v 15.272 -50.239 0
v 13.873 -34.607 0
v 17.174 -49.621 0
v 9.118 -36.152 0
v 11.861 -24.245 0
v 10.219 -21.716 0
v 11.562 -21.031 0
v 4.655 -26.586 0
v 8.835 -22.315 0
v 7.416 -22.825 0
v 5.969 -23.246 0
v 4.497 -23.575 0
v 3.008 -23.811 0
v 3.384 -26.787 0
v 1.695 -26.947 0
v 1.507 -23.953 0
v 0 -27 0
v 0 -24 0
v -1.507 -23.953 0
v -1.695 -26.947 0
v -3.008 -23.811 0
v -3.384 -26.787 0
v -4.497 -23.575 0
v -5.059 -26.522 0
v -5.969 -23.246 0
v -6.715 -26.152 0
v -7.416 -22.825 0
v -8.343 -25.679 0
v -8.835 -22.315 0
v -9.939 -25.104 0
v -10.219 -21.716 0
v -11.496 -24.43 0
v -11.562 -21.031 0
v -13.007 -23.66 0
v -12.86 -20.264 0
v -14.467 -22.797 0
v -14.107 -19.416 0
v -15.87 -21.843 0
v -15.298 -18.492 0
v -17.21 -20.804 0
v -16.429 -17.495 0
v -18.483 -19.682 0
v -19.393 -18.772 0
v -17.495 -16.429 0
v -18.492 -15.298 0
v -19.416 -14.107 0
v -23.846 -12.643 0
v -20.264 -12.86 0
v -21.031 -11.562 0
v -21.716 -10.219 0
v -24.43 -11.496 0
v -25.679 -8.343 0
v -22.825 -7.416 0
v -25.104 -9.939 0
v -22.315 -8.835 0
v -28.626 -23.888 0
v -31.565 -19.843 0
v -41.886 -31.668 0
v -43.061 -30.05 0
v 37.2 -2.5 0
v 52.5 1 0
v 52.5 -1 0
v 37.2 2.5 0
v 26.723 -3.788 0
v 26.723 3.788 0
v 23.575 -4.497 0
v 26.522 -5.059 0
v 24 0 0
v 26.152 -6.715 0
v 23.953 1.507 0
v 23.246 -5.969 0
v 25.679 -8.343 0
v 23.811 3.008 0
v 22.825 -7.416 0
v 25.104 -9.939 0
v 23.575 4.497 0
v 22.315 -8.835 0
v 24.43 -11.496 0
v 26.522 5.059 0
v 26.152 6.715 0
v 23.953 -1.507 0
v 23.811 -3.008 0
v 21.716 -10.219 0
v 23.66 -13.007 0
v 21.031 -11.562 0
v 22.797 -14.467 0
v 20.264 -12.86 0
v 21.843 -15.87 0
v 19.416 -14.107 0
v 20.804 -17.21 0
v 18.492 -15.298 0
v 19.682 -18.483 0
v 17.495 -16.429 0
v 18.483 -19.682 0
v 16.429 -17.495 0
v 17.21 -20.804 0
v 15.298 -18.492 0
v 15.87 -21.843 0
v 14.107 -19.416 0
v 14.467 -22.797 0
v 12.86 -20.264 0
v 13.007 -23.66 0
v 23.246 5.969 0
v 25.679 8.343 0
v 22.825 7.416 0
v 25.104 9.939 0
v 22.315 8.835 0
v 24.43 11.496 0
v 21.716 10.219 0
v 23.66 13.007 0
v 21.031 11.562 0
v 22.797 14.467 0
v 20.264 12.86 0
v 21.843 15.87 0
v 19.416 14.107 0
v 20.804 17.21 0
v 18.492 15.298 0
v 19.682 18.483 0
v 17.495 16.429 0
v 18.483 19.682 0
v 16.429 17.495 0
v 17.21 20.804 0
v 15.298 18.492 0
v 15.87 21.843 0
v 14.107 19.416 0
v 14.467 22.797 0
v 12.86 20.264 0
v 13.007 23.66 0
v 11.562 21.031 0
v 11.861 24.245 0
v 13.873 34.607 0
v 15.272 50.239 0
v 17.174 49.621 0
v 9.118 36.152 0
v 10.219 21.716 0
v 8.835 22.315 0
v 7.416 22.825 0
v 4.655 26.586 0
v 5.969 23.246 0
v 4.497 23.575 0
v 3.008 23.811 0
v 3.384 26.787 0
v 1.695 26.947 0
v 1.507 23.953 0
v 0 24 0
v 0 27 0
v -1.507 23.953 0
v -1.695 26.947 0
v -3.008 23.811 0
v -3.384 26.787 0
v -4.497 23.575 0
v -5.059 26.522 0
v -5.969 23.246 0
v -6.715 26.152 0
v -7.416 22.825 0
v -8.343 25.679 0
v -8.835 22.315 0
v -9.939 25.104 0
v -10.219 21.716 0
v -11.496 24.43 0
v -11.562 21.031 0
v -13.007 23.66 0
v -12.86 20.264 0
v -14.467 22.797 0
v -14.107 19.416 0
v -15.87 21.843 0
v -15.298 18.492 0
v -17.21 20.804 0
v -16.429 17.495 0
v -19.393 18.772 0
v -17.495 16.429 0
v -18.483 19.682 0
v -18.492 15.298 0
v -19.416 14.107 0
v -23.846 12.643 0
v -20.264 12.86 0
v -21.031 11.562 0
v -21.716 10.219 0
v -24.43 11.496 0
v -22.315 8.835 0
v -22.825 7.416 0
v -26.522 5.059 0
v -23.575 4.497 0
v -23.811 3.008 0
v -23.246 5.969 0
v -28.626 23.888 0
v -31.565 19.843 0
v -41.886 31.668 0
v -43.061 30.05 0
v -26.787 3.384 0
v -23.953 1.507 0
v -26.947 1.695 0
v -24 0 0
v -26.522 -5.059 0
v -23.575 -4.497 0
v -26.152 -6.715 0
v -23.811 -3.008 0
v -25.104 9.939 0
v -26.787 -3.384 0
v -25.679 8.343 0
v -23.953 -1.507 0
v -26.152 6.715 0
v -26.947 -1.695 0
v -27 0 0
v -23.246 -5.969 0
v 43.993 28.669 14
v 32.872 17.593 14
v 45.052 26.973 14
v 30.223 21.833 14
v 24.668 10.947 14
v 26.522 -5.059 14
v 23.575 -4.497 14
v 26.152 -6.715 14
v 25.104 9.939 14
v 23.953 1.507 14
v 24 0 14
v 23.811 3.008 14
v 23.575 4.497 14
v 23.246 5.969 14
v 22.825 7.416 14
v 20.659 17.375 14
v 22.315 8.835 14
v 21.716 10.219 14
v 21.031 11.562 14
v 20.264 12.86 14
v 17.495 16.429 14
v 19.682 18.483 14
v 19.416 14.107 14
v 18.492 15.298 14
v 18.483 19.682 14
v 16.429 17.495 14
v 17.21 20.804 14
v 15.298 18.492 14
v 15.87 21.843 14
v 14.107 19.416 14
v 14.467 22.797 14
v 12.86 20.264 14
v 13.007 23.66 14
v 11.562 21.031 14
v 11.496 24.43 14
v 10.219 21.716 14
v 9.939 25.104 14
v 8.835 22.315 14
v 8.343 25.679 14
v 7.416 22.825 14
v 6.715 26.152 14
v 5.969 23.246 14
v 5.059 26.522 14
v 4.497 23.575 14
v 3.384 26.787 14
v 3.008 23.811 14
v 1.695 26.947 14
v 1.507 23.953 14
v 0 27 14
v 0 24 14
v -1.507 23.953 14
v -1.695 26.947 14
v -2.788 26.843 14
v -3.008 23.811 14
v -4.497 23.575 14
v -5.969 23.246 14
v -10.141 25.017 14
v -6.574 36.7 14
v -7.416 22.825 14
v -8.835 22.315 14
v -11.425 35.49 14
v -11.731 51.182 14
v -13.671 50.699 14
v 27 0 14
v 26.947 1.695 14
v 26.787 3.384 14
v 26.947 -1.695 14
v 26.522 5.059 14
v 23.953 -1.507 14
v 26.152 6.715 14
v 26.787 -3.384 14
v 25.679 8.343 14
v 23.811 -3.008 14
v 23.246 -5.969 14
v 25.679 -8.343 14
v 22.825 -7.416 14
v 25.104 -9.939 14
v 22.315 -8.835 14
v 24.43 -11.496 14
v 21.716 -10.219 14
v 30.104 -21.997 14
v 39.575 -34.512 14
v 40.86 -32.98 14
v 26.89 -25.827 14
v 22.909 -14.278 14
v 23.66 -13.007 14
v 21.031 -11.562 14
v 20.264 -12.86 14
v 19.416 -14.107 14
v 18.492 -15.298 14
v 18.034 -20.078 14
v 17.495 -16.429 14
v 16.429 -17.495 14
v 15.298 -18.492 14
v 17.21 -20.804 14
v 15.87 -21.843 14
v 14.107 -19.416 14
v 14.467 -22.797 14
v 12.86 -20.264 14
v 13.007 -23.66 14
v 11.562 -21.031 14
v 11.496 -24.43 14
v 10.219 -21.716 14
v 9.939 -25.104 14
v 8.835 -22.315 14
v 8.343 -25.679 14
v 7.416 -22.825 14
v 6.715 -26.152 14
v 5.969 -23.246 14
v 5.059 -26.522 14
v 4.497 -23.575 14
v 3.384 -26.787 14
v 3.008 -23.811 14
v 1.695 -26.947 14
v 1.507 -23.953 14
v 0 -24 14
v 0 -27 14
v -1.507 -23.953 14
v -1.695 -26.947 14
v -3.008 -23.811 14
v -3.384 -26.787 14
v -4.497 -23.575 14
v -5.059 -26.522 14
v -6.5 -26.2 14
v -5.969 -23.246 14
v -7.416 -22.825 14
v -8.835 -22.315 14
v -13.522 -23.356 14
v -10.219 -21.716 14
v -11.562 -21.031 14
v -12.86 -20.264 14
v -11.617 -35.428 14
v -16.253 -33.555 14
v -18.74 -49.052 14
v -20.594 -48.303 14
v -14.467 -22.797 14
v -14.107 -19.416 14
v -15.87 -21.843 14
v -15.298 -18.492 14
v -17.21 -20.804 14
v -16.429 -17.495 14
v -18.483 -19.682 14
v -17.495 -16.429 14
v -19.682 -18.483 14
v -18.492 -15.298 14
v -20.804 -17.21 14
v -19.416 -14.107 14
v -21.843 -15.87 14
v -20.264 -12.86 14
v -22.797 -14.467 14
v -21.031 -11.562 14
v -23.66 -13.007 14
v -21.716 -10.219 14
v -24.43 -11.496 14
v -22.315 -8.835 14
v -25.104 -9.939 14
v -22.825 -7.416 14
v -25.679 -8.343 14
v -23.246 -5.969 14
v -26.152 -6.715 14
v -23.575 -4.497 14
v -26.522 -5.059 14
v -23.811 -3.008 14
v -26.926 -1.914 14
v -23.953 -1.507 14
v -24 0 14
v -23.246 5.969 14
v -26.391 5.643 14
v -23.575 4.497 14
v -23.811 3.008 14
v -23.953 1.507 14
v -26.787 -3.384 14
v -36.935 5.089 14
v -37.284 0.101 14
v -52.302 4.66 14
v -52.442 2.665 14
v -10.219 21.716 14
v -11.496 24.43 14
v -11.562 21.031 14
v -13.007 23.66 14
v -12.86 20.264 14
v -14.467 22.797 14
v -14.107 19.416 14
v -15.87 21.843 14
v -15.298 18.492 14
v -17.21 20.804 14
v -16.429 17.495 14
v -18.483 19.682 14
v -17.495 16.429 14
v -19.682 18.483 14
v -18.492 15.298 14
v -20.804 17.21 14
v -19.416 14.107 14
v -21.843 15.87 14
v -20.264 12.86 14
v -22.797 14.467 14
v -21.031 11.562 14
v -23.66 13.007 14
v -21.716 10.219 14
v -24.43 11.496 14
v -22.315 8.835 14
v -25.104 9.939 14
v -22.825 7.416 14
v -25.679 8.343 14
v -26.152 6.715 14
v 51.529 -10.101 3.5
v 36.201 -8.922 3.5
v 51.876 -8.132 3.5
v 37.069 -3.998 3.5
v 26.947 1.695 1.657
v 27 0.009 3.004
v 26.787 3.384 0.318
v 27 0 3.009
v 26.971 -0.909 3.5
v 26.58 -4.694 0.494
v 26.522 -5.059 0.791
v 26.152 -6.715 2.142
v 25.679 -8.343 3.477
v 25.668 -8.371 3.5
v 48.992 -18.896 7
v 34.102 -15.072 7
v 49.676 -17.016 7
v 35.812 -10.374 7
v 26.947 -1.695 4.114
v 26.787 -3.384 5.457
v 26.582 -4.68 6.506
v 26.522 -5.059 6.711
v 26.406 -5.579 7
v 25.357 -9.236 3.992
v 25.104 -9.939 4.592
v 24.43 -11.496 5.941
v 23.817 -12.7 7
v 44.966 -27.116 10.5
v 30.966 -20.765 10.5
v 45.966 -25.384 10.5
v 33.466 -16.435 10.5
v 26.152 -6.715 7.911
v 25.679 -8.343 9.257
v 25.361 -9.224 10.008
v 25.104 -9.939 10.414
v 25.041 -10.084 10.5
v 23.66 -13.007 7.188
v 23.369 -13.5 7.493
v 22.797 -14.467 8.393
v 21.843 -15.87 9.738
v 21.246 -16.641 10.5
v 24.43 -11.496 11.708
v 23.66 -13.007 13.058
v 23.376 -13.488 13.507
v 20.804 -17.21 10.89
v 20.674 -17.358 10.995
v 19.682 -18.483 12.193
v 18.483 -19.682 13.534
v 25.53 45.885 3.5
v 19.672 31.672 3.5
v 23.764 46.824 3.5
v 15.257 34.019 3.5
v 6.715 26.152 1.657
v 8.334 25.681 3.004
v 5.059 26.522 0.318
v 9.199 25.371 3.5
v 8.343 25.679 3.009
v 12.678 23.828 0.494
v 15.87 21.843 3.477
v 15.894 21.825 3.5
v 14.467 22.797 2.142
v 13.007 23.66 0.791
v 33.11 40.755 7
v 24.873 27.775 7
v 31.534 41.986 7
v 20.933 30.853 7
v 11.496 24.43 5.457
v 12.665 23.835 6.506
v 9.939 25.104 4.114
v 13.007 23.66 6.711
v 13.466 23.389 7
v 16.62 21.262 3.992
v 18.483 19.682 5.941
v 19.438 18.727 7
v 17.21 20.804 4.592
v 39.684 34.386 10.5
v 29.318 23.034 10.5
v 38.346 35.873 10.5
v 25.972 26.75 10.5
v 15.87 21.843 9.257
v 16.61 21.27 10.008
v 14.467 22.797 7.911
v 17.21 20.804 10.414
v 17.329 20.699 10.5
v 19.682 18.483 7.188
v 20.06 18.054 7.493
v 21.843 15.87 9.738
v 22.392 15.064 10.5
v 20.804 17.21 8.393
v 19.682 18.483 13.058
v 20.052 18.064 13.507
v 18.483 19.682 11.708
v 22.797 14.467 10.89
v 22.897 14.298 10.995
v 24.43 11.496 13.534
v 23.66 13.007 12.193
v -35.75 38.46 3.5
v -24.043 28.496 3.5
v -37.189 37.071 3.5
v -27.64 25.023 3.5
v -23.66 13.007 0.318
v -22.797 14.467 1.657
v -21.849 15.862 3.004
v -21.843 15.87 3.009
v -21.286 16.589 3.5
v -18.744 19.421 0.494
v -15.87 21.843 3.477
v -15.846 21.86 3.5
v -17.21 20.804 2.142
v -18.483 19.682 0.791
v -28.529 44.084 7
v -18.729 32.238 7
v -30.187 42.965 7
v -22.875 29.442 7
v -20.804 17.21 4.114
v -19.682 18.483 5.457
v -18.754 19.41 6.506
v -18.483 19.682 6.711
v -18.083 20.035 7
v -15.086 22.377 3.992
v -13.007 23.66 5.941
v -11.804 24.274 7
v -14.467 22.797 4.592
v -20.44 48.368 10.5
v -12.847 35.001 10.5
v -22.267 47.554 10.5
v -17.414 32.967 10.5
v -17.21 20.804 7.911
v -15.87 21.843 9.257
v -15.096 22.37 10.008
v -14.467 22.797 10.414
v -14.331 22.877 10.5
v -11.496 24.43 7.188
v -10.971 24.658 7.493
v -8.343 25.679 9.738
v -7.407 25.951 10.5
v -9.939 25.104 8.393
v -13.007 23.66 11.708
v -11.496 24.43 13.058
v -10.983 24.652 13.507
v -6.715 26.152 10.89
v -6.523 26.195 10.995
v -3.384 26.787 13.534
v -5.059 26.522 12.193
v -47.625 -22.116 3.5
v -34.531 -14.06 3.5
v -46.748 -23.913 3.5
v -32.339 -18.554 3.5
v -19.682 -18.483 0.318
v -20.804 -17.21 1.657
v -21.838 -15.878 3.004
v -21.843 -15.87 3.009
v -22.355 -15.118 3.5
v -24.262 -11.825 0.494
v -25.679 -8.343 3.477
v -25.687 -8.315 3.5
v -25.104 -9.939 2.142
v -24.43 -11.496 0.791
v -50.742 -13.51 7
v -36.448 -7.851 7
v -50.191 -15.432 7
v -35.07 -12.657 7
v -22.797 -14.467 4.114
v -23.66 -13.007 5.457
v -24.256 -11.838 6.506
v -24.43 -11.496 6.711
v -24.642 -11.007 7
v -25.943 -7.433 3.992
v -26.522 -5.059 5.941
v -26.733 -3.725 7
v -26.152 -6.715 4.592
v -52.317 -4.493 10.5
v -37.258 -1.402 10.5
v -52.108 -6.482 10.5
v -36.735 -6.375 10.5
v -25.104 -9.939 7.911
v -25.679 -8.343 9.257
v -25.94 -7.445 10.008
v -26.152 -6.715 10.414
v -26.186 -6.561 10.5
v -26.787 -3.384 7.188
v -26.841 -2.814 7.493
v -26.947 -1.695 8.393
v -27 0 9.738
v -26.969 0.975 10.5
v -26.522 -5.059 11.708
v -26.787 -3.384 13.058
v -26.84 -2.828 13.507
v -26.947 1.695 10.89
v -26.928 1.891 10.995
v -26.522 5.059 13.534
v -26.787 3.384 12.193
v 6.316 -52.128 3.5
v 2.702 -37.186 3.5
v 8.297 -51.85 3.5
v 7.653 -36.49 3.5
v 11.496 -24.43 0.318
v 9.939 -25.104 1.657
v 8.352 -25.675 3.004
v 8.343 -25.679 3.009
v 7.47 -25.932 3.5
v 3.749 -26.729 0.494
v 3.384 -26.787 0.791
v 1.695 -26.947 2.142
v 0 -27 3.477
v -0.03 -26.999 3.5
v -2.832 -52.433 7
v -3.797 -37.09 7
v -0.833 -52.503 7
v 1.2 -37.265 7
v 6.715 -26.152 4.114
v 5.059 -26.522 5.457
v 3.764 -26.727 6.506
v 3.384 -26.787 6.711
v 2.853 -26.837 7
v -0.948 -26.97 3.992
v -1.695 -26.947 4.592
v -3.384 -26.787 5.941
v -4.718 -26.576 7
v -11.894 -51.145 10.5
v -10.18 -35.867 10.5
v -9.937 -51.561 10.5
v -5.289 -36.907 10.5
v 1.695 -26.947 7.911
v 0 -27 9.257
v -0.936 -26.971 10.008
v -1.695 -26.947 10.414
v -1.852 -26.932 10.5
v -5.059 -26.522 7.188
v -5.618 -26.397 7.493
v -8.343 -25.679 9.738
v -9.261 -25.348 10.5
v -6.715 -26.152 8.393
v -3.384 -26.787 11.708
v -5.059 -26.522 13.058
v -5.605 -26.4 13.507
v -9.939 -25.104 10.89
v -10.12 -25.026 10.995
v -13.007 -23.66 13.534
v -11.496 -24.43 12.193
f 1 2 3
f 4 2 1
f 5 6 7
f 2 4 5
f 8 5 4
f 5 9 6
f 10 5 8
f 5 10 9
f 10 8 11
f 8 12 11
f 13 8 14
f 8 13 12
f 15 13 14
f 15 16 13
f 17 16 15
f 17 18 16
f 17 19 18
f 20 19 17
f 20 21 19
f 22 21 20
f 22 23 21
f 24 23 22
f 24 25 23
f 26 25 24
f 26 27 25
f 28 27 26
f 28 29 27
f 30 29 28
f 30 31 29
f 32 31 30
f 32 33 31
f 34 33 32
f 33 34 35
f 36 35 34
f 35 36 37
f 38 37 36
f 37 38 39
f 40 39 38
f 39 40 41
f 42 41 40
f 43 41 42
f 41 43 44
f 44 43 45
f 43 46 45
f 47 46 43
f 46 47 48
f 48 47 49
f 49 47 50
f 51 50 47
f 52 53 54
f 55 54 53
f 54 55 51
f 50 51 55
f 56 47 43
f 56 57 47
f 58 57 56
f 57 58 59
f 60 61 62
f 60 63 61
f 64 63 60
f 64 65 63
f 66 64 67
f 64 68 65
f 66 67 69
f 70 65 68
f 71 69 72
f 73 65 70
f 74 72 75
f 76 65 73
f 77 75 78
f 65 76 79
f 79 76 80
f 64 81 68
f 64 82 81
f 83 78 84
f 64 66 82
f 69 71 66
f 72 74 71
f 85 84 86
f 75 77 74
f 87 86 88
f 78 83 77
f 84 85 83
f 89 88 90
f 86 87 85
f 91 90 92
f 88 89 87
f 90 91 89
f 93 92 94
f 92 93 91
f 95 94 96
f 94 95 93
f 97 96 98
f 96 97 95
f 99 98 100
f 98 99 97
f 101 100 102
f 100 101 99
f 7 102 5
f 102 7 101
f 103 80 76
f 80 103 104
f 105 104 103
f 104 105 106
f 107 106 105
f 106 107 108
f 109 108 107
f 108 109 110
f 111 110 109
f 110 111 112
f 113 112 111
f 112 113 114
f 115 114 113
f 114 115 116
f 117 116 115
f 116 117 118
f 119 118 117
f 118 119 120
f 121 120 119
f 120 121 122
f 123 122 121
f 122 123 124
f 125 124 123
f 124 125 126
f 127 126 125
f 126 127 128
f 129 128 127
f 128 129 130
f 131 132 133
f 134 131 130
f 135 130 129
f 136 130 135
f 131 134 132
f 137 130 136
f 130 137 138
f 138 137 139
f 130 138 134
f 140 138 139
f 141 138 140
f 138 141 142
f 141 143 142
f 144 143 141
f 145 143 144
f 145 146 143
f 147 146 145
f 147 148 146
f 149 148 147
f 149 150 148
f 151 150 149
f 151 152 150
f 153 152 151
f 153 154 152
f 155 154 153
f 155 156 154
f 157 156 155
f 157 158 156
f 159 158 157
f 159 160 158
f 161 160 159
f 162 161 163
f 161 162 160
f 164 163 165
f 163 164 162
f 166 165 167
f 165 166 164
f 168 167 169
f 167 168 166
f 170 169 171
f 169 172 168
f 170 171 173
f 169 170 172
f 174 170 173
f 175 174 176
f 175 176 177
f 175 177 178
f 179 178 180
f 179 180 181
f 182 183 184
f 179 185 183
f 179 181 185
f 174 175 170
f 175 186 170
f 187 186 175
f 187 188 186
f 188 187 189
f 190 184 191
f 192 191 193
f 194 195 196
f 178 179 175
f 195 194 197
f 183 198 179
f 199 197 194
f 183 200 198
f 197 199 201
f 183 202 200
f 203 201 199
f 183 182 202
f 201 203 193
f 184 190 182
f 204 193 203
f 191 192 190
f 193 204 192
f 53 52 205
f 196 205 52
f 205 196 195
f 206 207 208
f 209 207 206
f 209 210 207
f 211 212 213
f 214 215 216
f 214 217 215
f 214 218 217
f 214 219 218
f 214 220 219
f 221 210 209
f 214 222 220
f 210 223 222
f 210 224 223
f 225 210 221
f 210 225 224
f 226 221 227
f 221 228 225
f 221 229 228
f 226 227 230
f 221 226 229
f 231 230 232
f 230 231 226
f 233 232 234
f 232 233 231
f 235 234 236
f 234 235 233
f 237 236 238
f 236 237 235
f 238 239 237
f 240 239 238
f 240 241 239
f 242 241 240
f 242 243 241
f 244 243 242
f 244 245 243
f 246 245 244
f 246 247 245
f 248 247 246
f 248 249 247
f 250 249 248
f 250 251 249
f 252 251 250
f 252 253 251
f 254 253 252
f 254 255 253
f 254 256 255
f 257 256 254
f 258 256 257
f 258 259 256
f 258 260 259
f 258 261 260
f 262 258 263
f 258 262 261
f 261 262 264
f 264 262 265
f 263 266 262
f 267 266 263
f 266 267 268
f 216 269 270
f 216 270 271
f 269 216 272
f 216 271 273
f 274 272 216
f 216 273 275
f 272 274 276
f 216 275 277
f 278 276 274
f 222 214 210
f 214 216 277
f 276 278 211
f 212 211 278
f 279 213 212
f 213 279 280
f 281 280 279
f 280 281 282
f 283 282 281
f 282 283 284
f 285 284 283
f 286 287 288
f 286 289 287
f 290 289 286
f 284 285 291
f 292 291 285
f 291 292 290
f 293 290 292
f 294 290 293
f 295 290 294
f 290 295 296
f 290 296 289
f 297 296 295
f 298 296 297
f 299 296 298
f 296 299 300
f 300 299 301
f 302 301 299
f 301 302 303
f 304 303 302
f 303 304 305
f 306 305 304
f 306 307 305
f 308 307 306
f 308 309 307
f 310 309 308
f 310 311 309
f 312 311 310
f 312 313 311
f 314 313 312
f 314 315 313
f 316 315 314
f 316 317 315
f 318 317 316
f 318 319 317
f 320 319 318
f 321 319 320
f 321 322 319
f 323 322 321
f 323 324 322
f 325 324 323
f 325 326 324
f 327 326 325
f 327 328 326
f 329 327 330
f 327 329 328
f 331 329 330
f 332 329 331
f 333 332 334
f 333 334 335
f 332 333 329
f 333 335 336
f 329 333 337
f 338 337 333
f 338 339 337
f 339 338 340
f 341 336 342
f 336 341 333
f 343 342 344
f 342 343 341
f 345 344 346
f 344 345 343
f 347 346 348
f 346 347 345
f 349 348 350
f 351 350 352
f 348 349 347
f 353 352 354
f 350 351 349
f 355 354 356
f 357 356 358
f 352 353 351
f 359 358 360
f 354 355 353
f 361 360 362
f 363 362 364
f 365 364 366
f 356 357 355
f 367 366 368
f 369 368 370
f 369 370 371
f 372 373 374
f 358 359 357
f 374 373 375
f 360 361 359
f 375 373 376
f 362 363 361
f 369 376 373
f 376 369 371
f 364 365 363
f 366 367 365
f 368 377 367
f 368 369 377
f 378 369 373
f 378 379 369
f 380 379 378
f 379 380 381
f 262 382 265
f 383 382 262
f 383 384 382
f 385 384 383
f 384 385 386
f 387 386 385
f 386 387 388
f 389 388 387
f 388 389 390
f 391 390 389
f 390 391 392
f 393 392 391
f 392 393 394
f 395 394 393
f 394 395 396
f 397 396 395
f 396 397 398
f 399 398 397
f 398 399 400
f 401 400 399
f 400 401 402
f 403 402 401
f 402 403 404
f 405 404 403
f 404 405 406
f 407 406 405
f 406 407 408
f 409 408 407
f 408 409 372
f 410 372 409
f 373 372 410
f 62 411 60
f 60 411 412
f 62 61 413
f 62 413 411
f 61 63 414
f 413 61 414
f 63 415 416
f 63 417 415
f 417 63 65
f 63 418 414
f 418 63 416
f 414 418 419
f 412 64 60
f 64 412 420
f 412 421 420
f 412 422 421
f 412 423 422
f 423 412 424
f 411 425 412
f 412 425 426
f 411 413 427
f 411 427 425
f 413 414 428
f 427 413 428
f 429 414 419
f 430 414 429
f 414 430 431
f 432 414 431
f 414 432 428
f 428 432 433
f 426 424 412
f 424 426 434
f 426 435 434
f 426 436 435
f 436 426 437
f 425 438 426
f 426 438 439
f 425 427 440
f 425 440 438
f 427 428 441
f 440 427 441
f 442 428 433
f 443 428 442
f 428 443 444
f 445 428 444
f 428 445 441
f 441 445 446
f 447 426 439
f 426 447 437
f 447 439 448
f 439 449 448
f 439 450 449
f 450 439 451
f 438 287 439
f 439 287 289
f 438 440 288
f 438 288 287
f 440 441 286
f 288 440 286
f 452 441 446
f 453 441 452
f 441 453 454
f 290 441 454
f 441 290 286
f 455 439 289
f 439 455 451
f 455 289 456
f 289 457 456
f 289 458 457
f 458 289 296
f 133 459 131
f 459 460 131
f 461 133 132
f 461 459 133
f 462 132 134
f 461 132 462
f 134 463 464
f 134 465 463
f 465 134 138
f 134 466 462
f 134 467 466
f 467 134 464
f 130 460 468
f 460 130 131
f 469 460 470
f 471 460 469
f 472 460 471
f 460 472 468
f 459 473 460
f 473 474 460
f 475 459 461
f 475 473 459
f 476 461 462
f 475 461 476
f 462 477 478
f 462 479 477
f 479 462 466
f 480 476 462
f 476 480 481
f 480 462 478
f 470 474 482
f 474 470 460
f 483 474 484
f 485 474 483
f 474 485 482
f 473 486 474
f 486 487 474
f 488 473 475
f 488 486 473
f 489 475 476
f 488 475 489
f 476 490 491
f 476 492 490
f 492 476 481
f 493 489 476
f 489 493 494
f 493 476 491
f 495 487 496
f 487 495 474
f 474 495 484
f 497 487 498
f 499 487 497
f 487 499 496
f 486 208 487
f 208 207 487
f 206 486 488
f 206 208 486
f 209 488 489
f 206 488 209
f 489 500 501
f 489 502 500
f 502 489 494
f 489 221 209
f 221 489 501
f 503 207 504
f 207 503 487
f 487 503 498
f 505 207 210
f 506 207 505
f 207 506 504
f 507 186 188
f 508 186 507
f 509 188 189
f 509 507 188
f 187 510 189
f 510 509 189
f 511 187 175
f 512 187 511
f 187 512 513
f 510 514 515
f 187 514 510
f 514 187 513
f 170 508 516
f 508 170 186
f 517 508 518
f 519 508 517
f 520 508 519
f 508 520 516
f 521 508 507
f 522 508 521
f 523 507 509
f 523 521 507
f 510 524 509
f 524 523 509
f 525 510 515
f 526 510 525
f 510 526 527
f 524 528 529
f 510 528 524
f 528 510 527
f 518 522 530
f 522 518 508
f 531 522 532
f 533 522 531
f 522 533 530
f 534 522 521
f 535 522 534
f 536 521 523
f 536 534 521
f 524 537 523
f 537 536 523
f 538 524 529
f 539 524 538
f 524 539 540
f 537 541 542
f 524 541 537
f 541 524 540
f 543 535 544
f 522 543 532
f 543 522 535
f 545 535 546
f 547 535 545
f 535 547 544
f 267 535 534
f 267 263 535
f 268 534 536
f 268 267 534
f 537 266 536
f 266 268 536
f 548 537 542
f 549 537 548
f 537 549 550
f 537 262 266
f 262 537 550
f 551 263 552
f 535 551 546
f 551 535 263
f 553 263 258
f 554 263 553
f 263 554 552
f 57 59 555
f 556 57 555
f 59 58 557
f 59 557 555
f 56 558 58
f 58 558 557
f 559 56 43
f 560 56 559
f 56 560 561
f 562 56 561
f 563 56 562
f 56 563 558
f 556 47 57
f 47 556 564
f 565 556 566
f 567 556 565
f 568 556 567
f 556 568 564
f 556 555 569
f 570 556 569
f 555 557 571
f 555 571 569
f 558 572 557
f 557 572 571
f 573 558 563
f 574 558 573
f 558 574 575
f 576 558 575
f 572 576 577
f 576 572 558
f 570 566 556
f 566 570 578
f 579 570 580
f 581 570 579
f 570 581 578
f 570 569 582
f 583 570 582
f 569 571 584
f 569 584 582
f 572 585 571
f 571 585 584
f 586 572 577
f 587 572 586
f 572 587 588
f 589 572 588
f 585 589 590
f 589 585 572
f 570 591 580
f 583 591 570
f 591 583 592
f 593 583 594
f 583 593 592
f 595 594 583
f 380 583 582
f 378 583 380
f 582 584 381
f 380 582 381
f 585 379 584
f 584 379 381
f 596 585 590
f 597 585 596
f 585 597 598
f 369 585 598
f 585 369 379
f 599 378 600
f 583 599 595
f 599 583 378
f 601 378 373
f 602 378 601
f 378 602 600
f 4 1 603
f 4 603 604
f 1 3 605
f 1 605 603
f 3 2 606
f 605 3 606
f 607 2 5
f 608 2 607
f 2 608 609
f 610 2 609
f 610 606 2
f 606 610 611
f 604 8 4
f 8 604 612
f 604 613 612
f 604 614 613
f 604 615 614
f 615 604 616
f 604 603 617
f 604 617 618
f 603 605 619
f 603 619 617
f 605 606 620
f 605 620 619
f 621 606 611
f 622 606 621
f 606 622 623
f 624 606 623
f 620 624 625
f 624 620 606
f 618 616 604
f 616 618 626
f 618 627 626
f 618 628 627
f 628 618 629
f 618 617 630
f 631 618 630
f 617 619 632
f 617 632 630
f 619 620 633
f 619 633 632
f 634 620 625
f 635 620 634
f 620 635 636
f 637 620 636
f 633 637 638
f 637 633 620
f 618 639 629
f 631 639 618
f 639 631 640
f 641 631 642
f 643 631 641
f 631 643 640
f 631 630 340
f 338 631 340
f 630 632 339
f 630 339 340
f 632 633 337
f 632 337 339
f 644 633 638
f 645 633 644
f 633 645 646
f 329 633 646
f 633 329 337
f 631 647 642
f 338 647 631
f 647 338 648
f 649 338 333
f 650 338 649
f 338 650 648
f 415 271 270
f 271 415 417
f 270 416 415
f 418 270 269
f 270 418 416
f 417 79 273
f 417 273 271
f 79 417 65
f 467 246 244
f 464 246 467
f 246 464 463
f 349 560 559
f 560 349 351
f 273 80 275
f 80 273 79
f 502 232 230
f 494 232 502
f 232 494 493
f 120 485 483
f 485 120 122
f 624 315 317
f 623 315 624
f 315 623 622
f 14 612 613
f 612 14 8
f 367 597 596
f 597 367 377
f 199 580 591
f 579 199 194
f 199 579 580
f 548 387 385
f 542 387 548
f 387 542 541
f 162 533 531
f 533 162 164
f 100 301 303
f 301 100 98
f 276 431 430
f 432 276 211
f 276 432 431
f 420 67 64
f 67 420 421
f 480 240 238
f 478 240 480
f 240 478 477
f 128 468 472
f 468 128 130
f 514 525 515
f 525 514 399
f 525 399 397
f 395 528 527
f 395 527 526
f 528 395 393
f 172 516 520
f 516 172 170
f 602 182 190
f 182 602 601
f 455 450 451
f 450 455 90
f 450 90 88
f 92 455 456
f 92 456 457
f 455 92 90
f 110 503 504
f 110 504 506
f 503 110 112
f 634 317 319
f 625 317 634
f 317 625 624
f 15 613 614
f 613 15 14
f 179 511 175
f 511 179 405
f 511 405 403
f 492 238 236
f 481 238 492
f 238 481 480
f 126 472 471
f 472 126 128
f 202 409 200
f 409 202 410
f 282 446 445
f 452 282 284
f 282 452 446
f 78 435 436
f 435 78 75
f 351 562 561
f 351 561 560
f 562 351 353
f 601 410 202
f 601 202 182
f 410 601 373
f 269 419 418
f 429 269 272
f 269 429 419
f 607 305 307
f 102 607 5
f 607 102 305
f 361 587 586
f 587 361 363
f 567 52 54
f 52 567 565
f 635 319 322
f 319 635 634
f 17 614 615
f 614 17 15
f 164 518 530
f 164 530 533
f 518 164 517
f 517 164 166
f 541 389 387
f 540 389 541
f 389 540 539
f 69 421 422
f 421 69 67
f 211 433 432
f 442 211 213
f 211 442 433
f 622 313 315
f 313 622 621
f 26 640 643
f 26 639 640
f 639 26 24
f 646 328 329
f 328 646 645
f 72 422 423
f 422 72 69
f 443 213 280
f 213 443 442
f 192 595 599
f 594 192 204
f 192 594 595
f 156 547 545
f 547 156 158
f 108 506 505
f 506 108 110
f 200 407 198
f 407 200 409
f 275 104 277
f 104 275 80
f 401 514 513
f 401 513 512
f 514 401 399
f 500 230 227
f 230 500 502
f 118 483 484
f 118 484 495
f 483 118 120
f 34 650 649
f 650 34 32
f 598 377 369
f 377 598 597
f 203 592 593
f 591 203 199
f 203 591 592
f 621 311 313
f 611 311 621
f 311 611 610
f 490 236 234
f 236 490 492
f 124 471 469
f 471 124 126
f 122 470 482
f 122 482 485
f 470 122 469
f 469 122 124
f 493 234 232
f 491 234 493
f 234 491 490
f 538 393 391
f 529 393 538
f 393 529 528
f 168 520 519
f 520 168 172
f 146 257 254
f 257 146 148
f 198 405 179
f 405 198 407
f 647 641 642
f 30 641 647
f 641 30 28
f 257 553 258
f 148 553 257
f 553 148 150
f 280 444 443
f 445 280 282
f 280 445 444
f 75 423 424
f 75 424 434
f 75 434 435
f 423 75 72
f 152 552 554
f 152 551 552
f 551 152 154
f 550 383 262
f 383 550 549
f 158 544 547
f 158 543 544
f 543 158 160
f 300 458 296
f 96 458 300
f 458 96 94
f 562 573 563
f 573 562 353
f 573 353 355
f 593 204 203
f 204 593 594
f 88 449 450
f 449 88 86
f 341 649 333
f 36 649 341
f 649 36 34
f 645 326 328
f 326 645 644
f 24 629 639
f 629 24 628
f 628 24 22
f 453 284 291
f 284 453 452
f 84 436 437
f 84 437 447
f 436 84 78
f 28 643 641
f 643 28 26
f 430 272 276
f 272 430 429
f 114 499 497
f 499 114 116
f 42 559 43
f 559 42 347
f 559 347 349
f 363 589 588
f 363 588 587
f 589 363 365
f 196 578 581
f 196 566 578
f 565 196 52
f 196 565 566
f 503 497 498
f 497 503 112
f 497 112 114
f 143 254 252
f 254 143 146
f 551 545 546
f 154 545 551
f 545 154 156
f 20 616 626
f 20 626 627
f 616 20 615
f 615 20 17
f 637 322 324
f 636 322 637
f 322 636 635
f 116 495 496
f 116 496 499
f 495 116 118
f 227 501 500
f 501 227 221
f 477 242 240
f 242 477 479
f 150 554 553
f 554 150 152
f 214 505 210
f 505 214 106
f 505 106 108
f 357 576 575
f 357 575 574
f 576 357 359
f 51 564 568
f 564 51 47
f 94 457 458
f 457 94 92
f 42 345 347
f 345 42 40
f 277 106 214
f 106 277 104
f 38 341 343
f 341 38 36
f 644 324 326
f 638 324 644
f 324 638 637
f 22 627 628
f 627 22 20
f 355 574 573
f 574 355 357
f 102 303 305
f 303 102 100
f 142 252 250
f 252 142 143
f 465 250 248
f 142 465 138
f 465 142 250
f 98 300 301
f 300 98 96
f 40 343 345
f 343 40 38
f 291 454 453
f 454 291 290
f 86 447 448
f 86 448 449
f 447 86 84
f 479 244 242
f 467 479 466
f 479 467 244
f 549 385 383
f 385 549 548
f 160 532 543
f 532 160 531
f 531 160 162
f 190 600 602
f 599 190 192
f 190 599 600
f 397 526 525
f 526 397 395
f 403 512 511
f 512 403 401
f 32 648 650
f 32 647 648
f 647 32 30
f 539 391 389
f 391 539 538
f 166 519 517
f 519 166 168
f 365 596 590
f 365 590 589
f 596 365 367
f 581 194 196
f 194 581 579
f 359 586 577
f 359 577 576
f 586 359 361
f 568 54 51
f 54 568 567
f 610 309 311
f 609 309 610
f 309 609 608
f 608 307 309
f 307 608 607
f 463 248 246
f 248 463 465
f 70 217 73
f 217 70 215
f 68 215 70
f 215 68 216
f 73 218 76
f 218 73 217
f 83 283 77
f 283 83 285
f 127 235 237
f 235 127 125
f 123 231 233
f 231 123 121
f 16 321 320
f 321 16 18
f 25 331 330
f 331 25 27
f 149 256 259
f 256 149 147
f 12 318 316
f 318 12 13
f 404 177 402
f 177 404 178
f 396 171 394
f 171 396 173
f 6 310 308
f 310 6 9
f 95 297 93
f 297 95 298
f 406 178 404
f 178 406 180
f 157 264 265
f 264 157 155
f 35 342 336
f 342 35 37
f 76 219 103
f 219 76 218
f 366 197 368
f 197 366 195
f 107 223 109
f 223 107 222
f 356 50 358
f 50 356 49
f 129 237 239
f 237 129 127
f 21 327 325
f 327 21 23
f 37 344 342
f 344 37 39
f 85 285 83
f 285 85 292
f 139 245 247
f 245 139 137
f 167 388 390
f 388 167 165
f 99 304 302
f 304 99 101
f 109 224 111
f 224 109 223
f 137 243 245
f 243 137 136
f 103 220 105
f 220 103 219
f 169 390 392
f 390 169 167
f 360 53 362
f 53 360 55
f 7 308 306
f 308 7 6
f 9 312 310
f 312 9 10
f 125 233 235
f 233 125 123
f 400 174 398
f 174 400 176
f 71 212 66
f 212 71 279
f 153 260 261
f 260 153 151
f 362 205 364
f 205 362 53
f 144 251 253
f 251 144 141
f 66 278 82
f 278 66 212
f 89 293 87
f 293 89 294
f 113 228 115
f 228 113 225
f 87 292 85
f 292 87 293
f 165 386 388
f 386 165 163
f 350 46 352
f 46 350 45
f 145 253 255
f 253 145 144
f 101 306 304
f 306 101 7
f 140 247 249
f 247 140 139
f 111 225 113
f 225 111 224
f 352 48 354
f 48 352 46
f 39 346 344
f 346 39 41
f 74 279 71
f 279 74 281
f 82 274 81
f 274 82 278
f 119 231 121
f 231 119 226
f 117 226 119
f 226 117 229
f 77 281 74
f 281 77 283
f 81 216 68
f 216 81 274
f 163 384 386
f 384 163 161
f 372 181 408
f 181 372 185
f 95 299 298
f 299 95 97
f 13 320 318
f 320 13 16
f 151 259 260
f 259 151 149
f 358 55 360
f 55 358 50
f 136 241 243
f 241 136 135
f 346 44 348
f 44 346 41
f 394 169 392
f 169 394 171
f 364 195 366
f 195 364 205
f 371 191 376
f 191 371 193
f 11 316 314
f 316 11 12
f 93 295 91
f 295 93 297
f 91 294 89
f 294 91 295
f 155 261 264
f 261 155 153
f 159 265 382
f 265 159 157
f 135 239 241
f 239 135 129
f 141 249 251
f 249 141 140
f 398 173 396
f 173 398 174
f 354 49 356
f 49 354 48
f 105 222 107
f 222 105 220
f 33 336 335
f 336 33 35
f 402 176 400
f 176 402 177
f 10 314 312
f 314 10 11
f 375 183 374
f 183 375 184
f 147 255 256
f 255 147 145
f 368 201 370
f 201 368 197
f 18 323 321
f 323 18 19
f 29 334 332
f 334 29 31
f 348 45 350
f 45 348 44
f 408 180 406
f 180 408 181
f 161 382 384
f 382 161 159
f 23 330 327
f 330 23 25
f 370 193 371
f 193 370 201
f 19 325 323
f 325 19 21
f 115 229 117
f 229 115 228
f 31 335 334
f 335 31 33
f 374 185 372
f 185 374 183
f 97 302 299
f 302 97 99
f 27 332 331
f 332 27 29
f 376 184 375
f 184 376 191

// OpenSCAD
// === Параметри вентилятора (тонкі лопаті для 5В мотора) ===
blades = 5;                         
hub_radius = 27;                    
shaft_radius = 24;                  
fan_radius = 52.5;                  
blade_length = fan_radius - hub_radius;

height = 14;                        // Зменшена товщина лопаті
twist = 40
;                       // Менший кут крутки для тонших лопатей

// === Параметри лопаті (тонші) ===
blade_overlap = 2;                 
blade_base_width = 8;             // Вдвічі менше, ніж раніше
blade_mid_width = 5;
blade_tip_width = 2;

// === Перевірка втулки ===
wall_thickness = hub_radius - shaft_radius;
if (wall_thickness < 2)
    echo("⚠️ Увага: тонка втулка (", wall_thickness, " мм)");

// === Модуль лопаті ===
module blade() {
    linear_extrude(height = height, twist = twist)
        polygon(points=[
            [hub_radius - blade_overlap, -blade_base_width/2],
            [hub_radius + blade_length * 0.4, -blade_mid_width/2],
            [hub_radius + blade_length, -blade_tip_width/2],
            [hub_radius + blade_length, blade_tip_width/2],
            [hub_radius + blade_length * 0.4, blade_mid_width/2],
            [hub_radius - blade_overlap, blade_base_width/2]
        ]);
}

// === Повна модель вентилятора ===
module fan_with_hub() {
    difference() {
        union() {
            cylinder(h = height, r = hub_radius, $fn = 100);
            for (i = [0 : 360/blades : 360 - 360/blades]) {
                rotate([0,0,i])
                    blade();
            }
        }
        cylinder(h = height + 0.1, r = shaft_radius, $fn = 100);
    }
}

fan_with_hub();
